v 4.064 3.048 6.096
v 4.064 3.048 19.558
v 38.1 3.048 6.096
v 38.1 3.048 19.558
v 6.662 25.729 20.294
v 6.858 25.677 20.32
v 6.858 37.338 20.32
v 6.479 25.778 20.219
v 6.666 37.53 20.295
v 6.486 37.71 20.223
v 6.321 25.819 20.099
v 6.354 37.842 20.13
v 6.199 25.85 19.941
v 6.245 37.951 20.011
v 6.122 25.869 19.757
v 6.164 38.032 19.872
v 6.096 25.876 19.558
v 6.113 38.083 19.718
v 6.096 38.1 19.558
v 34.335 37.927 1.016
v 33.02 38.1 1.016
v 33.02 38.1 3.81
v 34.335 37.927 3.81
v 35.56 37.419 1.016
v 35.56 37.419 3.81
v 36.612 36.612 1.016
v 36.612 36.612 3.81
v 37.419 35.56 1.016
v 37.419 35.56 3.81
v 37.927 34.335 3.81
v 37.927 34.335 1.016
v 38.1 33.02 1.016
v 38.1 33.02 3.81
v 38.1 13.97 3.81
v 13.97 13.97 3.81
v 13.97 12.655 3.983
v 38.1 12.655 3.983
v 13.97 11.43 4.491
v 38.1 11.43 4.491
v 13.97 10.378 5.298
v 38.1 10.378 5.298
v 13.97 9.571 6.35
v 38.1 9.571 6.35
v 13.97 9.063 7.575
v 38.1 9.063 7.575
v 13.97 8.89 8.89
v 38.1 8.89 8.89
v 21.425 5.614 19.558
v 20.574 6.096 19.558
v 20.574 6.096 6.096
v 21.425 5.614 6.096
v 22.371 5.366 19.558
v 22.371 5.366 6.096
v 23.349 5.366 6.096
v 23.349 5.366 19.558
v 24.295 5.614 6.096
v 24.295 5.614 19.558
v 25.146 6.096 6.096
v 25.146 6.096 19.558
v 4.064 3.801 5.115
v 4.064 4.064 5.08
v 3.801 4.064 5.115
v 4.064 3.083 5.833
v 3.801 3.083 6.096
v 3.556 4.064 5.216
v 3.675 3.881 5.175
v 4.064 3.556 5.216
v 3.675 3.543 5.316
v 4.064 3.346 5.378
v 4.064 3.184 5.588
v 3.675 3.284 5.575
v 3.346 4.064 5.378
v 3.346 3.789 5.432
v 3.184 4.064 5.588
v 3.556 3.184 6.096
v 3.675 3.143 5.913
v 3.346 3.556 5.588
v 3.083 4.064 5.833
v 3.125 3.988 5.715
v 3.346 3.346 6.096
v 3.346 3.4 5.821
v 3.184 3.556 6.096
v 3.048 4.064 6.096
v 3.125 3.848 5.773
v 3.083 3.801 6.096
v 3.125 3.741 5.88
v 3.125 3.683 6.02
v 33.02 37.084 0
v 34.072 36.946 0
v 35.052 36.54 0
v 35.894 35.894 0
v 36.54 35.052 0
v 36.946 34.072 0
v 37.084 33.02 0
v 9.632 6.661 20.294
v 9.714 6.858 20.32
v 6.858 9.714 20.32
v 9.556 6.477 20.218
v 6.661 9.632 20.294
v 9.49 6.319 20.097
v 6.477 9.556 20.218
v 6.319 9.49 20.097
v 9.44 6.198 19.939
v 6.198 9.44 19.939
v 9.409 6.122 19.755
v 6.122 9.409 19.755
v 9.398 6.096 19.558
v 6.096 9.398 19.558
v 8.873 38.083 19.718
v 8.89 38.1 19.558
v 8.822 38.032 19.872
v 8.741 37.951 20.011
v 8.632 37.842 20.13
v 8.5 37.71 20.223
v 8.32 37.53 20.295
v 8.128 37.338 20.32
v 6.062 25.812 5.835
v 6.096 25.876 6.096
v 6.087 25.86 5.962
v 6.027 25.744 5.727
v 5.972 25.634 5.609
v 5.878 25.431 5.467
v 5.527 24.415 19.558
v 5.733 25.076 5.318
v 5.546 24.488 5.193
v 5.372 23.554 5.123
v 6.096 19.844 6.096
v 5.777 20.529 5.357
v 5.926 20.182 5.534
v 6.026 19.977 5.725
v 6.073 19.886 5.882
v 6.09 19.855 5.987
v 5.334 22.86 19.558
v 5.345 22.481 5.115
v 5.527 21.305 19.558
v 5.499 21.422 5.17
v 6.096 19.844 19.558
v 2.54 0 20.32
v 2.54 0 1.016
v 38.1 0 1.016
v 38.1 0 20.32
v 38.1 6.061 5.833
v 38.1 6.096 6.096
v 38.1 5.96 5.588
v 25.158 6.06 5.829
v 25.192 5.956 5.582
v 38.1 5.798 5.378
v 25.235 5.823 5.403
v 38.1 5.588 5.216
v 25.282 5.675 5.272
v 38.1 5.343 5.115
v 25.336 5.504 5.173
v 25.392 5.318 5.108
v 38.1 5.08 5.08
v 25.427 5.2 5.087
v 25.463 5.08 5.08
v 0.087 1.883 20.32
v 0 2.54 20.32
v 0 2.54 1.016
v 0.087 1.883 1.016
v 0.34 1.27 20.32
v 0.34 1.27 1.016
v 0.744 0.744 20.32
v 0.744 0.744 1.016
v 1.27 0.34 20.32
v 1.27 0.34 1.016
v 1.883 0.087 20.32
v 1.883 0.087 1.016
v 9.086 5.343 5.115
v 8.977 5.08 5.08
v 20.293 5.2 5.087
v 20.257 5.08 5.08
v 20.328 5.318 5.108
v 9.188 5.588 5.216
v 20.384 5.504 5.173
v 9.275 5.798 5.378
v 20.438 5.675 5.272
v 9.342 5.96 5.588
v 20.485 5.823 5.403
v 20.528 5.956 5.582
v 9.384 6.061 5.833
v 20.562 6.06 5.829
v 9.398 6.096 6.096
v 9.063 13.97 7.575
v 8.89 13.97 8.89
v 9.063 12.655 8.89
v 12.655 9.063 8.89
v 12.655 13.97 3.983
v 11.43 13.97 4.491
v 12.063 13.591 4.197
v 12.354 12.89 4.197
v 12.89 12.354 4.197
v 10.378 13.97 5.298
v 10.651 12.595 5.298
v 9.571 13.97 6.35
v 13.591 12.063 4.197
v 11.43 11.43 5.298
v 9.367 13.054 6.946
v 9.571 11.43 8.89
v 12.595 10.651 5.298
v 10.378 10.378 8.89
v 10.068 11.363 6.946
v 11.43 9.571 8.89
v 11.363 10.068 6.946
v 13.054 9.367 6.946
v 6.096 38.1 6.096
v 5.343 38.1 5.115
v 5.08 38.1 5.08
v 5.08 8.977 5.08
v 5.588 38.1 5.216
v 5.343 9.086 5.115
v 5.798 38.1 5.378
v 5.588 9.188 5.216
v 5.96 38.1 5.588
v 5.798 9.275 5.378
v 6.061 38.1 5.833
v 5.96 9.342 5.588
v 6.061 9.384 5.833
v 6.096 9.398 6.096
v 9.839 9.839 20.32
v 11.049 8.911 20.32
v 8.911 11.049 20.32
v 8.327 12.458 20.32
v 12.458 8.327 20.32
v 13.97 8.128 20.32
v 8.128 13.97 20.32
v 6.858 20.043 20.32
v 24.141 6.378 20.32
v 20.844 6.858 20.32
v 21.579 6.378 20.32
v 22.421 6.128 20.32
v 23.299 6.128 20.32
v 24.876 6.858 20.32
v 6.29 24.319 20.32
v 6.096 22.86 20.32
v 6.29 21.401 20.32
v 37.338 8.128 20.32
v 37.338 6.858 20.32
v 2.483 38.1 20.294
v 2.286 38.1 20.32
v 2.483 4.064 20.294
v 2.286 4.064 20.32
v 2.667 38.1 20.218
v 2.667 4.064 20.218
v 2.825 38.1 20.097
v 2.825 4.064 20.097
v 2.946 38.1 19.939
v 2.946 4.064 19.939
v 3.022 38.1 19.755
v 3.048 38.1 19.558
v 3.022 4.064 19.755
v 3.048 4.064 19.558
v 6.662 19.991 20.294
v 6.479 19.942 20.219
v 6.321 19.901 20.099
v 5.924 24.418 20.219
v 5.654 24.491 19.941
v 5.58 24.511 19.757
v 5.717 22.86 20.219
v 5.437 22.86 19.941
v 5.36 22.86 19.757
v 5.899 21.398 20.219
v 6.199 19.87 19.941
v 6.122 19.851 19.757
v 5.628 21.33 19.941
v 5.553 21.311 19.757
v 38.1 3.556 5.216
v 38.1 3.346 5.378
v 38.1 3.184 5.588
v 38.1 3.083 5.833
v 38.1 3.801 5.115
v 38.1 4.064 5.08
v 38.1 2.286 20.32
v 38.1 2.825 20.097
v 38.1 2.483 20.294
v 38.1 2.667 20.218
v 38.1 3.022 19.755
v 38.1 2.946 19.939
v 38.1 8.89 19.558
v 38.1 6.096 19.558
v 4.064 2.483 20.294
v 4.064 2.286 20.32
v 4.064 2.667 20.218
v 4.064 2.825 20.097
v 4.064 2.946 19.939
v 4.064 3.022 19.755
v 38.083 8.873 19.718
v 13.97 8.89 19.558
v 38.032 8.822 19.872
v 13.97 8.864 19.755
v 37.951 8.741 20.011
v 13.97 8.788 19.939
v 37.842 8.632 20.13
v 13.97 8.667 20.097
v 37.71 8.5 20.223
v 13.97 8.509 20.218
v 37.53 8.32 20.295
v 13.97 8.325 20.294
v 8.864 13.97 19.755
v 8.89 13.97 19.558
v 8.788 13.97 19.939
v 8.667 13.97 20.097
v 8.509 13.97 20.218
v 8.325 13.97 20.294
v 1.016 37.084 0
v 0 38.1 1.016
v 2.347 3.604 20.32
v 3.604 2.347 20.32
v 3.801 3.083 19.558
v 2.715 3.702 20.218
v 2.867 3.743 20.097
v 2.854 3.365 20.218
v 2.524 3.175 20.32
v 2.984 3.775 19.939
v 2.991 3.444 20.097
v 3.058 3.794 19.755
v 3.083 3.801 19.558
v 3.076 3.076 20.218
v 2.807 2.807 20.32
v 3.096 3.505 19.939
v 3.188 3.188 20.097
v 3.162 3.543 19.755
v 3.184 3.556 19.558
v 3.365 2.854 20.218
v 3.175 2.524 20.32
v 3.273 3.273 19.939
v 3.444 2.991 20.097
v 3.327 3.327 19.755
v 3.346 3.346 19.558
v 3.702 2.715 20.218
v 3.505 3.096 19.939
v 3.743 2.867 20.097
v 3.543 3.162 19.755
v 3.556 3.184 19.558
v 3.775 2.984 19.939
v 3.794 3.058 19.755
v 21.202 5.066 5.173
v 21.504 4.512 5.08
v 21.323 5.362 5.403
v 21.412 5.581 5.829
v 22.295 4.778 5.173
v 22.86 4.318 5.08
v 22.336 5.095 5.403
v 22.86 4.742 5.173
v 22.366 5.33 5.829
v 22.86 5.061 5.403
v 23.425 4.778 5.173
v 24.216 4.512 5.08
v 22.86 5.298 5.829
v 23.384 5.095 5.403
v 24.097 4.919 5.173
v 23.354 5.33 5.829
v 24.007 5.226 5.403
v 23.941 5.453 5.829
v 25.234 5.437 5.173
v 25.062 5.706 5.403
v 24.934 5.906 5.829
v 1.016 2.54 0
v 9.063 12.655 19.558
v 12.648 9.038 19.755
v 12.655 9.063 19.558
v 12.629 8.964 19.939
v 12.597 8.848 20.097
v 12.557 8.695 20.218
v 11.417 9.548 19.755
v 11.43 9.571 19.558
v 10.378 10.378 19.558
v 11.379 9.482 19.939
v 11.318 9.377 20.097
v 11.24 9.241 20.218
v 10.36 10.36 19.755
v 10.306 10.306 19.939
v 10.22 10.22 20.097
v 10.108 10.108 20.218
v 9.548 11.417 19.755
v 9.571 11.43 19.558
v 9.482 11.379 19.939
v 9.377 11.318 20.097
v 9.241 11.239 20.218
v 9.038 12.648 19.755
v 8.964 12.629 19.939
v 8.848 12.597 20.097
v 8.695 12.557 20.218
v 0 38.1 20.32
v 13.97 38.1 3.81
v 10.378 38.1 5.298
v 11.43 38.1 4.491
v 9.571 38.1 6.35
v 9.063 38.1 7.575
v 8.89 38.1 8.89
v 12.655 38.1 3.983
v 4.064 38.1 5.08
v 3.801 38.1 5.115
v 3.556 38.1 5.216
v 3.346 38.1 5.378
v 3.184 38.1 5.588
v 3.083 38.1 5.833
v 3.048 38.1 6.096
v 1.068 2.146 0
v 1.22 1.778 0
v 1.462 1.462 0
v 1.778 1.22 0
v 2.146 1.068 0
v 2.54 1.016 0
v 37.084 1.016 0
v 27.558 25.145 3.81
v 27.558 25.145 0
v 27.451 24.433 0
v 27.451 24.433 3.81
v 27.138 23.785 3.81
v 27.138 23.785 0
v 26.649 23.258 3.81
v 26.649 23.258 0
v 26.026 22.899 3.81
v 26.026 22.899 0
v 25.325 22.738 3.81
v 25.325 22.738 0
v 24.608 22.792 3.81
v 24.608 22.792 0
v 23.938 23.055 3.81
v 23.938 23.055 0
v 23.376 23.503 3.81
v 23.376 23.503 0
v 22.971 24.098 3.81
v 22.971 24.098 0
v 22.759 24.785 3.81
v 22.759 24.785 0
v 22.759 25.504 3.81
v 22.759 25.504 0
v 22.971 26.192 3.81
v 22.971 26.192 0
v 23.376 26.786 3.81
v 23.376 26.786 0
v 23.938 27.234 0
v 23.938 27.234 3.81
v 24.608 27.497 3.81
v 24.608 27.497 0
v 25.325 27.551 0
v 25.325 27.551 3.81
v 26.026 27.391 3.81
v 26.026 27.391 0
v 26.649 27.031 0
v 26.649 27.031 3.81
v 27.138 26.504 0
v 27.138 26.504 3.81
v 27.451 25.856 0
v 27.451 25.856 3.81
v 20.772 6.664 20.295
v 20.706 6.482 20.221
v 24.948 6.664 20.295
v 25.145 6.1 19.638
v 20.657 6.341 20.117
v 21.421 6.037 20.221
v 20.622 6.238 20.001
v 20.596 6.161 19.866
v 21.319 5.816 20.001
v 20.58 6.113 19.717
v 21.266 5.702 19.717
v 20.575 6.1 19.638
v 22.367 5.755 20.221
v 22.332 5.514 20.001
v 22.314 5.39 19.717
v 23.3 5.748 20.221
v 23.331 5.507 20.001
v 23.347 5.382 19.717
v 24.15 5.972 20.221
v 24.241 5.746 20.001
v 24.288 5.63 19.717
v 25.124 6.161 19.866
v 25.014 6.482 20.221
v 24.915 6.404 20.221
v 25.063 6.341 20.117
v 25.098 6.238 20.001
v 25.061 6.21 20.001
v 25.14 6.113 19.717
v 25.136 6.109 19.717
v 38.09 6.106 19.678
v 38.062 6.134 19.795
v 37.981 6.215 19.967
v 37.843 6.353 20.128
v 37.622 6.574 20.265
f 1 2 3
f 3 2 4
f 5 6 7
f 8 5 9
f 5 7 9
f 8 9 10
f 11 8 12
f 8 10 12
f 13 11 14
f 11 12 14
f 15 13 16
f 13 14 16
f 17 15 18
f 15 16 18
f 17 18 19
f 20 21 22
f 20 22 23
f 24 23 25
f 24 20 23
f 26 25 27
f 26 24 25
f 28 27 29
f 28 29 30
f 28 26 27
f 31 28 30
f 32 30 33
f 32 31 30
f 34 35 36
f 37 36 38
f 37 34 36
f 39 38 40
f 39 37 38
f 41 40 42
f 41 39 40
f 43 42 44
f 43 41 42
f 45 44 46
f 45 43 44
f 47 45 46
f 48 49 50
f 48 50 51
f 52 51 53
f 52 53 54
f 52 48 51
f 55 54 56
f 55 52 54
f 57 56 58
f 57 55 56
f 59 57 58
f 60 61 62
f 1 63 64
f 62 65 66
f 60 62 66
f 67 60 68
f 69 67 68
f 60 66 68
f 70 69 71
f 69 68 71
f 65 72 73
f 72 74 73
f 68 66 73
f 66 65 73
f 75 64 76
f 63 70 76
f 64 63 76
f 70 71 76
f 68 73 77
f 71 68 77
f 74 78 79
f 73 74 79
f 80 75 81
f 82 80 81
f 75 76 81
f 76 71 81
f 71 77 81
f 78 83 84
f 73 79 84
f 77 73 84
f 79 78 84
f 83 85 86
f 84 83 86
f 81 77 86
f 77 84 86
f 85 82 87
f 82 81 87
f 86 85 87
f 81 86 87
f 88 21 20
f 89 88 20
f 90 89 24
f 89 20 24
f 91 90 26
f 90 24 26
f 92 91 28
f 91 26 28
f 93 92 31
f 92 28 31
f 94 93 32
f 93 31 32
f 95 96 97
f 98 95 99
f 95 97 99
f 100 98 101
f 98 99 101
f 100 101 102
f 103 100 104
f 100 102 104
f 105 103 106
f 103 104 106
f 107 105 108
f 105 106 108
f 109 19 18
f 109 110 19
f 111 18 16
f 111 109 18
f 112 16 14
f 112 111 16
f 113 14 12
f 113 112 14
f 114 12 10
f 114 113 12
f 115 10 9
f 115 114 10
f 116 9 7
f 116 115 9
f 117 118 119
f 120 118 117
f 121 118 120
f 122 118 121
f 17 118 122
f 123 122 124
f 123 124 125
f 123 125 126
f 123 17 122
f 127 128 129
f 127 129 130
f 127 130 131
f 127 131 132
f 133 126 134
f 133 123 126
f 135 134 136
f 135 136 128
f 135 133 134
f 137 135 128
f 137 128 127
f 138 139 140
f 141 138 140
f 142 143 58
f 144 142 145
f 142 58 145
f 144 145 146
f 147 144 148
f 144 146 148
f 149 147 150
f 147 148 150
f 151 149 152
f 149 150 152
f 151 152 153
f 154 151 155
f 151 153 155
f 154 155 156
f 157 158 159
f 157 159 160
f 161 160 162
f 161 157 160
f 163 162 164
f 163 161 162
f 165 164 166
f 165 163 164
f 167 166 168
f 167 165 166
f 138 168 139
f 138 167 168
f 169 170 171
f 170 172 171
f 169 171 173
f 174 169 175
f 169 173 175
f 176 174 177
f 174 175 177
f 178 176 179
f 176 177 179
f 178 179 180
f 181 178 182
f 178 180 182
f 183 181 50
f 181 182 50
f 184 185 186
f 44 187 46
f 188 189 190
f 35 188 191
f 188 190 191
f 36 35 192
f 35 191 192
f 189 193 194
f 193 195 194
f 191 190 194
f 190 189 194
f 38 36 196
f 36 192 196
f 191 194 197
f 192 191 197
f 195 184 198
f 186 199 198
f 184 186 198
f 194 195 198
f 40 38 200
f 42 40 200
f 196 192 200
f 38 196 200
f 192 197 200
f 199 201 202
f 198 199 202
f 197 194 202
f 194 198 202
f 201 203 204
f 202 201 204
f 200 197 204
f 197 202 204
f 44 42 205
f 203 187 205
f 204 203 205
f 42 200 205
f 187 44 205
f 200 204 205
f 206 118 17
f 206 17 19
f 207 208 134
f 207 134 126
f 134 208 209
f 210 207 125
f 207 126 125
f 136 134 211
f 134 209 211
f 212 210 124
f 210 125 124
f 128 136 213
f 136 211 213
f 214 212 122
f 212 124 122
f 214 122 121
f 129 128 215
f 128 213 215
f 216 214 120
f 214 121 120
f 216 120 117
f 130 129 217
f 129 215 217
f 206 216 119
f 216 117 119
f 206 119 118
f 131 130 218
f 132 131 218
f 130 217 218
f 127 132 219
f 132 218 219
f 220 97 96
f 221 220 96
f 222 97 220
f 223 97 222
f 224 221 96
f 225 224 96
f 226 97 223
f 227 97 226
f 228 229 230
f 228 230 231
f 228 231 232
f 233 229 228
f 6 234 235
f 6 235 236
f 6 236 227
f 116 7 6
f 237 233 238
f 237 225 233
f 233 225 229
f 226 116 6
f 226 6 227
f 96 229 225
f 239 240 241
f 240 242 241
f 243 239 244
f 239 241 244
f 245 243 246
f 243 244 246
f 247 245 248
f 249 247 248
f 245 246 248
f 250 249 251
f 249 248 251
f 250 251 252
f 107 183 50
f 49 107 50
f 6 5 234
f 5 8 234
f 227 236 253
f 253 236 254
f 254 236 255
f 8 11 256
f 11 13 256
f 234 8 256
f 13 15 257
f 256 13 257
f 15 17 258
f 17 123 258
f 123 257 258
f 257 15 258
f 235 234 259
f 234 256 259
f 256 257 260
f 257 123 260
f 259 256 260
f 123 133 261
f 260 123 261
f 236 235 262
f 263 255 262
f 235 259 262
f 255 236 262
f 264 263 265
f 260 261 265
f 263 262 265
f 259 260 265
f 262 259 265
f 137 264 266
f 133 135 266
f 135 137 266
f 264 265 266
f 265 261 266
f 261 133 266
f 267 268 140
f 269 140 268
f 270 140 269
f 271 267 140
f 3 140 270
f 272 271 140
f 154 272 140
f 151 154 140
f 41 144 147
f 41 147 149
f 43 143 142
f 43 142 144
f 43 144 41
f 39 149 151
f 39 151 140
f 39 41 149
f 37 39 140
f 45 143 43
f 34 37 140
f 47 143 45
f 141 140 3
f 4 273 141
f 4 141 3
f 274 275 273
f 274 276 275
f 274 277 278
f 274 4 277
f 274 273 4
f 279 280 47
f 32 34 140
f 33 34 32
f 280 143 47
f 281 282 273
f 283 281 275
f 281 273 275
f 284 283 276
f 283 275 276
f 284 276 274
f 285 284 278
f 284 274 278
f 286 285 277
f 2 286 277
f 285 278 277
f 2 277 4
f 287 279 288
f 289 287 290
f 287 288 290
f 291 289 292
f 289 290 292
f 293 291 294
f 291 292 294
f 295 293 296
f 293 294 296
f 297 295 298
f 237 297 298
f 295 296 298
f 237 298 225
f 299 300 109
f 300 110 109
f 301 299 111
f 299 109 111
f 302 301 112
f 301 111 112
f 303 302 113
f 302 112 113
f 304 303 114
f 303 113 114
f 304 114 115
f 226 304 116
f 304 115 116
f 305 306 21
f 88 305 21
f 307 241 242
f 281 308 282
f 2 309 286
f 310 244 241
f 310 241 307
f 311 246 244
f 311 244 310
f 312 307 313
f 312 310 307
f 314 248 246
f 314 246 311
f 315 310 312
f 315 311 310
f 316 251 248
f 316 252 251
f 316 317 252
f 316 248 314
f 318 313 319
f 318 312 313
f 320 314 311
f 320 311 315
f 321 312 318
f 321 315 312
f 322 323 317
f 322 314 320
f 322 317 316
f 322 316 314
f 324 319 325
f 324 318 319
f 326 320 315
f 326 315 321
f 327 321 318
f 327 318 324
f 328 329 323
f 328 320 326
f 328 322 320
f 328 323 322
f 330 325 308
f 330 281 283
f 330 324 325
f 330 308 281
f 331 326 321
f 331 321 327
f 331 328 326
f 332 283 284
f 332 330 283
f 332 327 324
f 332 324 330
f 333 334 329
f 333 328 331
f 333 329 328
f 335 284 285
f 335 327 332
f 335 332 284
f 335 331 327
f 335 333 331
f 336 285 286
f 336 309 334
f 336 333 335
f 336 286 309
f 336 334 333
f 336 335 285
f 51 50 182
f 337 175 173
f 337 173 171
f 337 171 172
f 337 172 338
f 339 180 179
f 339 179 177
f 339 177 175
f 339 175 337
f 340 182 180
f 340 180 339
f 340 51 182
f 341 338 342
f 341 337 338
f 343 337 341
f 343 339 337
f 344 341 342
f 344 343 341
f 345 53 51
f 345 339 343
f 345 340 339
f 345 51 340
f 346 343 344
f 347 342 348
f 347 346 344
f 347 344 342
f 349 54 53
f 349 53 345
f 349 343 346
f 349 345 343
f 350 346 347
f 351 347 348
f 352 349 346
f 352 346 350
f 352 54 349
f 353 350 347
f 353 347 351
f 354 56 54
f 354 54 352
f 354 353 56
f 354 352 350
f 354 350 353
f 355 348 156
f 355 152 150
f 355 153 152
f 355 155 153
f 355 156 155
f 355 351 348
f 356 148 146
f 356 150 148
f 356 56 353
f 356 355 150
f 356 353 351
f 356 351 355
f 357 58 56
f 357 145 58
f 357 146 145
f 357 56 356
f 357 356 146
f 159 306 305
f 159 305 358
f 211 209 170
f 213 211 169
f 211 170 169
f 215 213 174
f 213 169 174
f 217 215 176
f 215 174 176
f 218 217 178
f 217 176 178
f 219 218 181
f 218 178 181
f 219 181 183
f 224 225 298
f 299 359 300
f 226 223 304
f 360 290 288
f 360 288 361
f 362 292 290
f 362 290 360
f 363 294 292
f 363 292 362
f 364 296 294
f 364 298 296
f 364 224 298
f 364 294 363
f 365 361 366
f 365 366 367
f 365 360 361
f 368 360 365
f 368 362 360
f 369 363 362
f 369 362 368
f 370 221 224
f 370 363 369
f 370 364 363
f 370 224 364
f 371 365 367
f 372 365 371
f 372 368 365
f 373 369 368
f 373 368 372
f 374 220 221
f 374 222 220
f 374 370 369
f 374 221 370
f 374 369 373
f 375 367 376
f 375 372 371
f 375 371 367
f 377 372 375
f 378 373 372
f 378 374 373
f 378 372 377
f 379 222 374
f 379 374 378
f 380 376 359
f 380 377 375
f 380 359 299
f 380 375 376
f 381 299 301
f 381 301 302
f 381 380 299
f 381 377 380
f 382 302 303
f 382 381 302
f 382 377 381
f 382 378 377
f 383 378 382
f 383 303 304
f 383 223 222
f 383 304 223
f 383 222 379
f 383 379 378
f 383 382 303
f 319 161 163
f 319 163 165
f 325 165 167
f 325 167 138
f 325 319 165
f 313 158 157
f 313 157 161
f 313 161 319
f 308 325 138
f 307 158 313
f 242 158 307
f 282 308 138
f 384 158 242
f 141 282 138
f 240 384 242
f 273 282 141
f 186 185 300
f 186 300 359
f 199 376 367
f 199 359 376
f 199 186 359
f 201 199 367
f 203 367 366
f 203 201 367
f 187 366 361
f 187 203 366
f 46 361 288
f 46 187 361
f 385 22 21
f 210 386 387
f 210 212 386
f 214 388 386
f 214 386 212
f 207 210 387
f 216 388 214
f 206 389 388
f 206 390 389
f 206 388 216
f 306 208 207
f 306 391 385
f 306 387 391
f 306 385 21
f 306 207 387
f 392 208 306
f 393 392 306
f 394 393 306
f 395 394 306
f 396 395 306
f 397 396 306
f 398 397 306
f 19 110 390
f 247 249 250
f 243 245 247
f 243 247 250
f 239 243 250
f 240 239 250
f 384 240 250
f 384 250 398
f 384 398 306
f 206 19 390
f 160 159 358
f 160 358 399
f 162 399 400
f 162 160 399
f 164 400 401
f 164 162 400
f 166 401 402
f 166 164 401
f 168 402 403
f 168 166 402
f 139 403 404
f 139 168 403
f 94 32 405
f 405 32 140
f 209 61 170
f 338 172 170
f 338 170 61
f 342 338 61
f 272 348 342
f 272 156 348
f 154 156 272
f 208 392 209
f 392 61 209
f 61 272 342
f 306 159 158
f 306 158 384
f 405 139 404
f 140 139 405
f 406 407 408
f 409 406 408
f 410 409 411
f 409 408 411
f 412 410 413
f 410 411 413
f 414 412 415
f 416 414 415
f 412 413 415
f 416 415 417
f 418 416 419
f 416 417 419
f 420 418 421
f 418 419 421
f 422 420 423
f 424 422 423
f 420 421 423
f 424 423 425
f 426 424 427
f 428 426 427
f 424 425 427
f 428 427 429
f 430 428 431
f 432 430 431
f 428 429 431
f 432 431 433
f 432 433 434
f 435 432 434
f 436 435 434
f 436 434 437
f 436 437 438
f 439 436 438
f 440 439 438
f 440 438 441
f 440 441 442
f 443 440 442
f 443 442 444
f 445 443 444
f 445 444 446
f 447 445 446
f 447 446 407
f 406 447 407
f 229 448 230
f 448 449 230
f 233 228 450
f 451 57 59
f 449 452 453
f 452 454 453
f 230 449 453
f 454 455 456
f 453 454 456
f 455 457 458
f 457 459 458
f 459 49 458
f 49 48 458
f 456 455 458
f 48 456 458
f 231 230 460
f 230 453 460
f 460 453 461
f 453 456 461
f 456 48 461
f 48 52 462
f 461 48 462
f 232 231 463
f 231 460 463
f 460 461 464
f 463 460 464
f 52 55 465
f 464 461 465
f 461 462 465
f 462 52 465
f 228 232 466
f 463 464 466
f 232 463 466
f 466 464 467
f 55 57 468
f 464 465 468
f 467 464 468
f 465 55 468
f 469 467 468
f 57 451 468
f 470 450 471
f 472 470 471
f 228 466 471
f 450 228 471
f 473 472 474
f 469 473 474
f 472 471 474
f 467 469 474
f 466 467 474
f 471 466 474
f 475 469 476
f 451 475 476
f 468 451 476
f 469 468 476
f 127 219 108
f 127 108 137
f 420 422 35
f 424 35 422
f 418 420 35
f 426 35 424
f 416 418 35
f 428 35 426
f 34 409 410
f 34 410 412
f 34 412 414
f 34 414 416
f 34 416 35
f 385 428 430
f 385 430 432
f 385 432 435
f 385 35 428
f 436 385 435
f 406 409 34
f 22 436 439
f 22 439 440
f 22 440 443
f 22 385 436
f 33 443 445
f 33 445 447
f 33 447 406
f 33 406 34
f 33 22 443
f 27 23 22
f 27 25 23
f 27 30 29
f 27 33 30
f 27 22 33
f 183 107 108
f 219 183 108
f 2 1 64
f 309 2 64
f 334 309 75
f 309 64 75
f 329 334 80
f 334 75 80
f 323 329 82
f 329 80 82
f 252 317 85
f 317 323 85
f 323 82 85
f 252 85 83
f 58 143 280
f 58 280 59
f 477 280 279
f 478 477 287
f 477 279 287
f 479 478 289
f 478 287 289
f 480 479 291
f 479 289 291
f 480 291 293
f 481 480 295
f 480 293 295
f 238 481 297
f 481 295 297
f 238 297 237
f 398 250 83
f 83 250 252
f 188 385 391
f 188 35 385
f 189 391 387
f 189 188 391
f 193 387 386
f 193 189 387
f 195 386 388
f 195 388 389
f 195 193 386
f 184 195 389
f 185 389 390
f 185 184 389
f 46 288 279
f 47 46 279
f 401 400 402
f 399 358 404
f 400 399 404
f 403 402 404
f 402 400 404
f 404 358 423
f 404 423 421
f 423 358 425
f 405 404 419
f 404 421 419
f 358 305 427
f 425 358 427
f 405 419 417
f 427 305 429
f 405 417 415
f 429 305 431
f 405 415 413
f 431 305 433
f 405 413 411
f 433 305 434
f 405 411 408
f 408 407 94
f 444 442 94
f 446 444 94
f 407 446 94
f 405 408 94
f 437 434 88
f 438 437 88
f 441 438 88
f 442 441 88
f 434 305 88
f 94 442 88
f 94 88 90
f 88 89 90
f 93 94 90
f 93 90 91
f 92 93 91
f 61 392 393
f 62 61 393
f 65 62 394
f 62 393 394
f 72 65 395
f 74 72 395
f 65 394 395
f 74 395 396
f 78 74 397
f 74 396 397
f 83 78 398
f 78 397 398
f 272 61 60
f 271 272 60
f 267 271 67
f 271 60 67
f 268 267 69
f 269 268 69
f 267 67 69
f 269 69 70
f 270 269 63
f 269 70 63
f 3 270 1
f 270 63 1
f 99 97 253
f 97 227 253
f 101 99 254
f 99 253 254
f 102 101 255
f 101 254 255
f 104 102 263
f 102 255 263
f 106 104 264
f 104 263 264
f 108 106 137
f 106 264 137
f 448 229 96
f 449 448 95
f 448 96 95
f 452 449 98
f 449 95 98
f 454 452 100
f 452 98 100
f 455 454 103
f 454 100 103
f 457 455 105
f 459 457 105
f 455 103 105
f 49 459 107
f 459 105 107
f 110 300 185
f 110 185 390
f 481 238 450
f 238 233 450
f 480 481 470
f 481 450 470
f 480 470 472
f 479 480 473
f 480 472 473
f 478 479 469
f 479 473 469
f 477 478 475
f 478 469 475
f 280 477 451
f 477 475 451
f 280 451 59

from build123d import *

# Parameters (mm, degrees)
F0_W          = 38.1
F0_H          = 38.1
F1_DEPTH      = 20.32
F2_W          = 29.21
F2_H          = 29.21
F3_DEPTH      = 16.51
F5_DEPTH      = 15.24
F6_T1_DEPTH   = 29.21
F7_R          = 5.08
F8_R          = 5.08
F9_R          = 2.54
F10_R         = 2.413
F11_DEPTH     = 20.321
F13_DEPTH     = 15.24
F14_T1_DEPTH  = 14.224
F14_T3_DEPTH  = 34.036
F14_T5_DEPTH  = 34.036
F14_T7_DEPTH  = 19.05
F14_T9_DEPTH  = 18.3199171099
F14_S13_W     = 1.03632
F14_S13_H     = 1.03632
F14_T14_DEPTH = 1.03632
F14_T20_DEPTH = 16.861733183
F14_T26_DEPTH = 22.6379171099
F14_T31_DEPTH = 23.368
F14_T36_ANGLE = 257.1357278548
F14_T42_DEPTH = 16.861733183
F14_T46_DEPTH = 23.368
F14_T53_DEPTH = 16.861733183
F14_T57_DEPTH = 22.6379171099
F15_SIZE      = 1.016
F16_R         = 0.762


# Not quite as in the source:
# - a fillet or chamfer that OpenCascade refuses, or shapes differently, is made with other operations: its cross-section is extruded or revolved along the edge and cut away or added


with BuildPart() as f1:
    # F0 (on Top) → F1 (new body)
    with BuildSketch(Plane.XY):
        with Locations((19.05, 19.05)):
            Rectangle(F0_W, F0_H)
    extrude(amount=F1_DEPTH)

    # F2 (on face) → F3 (cut)
    with BuildSketch(Plane.XY.offset(20.32)):
        with Locations((23.495, 23.495)):
            Rectangle(F2_W, F2_H)
    extrude(amount=-F3_DEPTH, mode=Mode.SUBTRACT)

    # F4 (on face) → F5 (cut)
    with BuildSketch(Plane.XY.offset(20.32)):
        Polygon((6.096, 38.1), (3.048, 38.1), (3.048, 3.048), (38.1, 3.048), (38.1, 6.096), (9.398, 6.096), (6.096, 6.096), (6.096, 9.398), align=None)
        Polygon((9.398, 6.096), (6.096, 9.398), (6.096, 6.096), align=None)
    extrude(amount=-F5_DEPTH, mode=Mode.SUBTRACT)

    # F6: fillet of radius 5.08 on 1 edges, made by hand

    # F6_s2 → F6_t1 (cut)
    with BuildSketch(Plane.XY.offset(-12.7)):
        with BuildLine():
            ThreePointArc((33.02, 38.1), (36.6121024484, 36.6121024484), (38.1, 33.02))
            Line((38.1, 33.02), (38.1, 38.1))
            Line((38.1, 38.1), (33.02, 38.1))
        make_face()
    extrude(amount=F6_T1_DEPTH, mode=Mode.SUBTRACT)

    # F7
    f7_edges = [f1.edges().sort_by_distance(p)[0] for p in [
        (8.89, 8.89, 12.065),
    ]]
    fillet(f7_edges, radius=F7_R)

    # F8
    f8_edges = [f1.edges().sort_by_distance(p)[0] for p in [
        (26.035, 8.89, 3.81),
        (10.377898, 10.377898, 3.81),
        (8.89, 26.035, 3.81),
    ]]
    fillet(f8_edges, radius=F8_R)

    # F9
    f9_edges = [f1.edges().sort_by_distance(p)[0] for p in [
        (0, 0, 10.16),
    ]]
    fillet(f9_edges, radius=F9_R)

    # F10 (on face) → F11 (cut, through all)
    with BuildSketch(Plane(origin=(0, 0, 0), x_dir=(1, 0, 0), z_dir=(0, 0, -1))):
        with Locations((25.144717139, -25.144717139)):
            Circle(F10_R)
    extrude(amount=-F11_DEPTH, mode=Mode.SUBTRACT)

    # F12 (on face) → F13 (join, through all)
    with BuildSketch(Plane.XY.offset(20.32)):
        with BuildLine():
            Line((25.146, 6.096), (20.574, 6.096))
            ThreePointArc((20.574, 6.096), (22.86, 5.334), (25.146, 6.096))
        make_face()
        with BuildLine():
            Line((6.096, 19.8439171099), (6.096, 25.8760828901))
            ThreePointArc((6.096, 25.8760828901), (5.334, 22.86), (6.096, 19.8439171099))
        make_face()
    extrude(amount=-F13_DEPTH)

    # F14: fillet of radius 1.016 on 9 edges, made by hand

    # F14_s2 → F14_t1 (join)
    with BuildSketch(Plane.XY.offset(6.096)):
        with BuildLine():
            ThreePointArc((4.064, 3.048), (3.3455795103, 3.3455795103), (3.048, 4.064))
            Line((3.048, 4.064), (3.02768, 4.064))
            Line((3.02768, 4.064), (3.02768, 3.02768))
            Line((3.02768, 3.02768), (4.064, 3.02768))
            Line((4.064, 3.02768), (4.064, 3.048))
        make_face()
    extrude(amount=F14_T1_DEPTH)

    # F14_s4 → F14_t3 (join)
    with BuildSketch(Plane.YZ.offset(4.064)):
        with BuildLine():
            ThreePointArc((4.064, 5.08), (3.3455795103, 5.3775795103), (3.048, 6.096))
            Line((3.048, 6.096), (3.02768, 6.096))
            Line((3.02768, 6.096), (3.02768, 5.05968))
            Line((3.02768, 5.05968), (4.064, 5.05968))
            Line((4.064, 5.05968), (4.064, 5.08))
        make_face()
    extrude(amount=F14_T3_DEPTH)

    # F14_s6 → F14_t5 (join)
    with BuildSketch(Plane.XZ.offset(-38.1)):
        with BuildLine():
            ThreePointArc((4.064, 5.08), (3.3455795103, 5.3775795103), (3.048, 6.096))
            Line((3.048, 6.096), (3.02768, 6.096))
            Line((3.02768, 6.096), (3.02768, 5.05968))
            Line((3.02768, 5.05968), (4.064, 5.05968))
            Line((4.064, 5.05968), (4.064, 5.08))
        make_face()
    extrude(amount=F14_T5_DEPTH)

    # F14_s8 → F14_t7 (join)
    with BuildSketch(Plane.YZ.offset(19.05)):
        with BuildLine():
            ThreePointArc((6.096, 6.096), (5.7984204897, 5.3775795103), (5.08, 5.08))
            Line((5.08, 5.08), (5.08, 5.05968))
            Line((5.08, 5.05968), (6.11632, 5.05968))
            Line((6.11632, 5.05968), (6.11632, 6.096))
            Line((6.11632, 6.096), (6.096, 6.096))
        make_face()
    extrude(amount=F14_T7_DEPTH)

    # F14_s10 → F14_t9 (join)
    with BuildSketch(Plane.XZ.offset(-38.1)):
        with BuildLine():
            ThreePointArc((5.08, 5.08), (5.7984204897, 5.3775795103), (6.096, 6.096))
            Line((6.096, 6.096), (6.11632, 6.096))
            Line((6.11632, 6.096), (6.11632, 5.05968))
            Line((6.11632, 5.05968), (5.08, 5.05968))
            Line((5.08, 5.05968), (5.08, 5.08))
        make_face()
    extrude(amount=F14_T9_DEPTH)


with BuildPart() as f14_tool12:
    # F14_s13 → F14_t14 (new body)
    with BuildSketch(Plane.YZ.offset(4.064)):
        with Locations((3.54584, 5.57784)):
            Rectangle(F14_S13_W, F14_S13_H)
    extrude(amount=-F14_T14_DEPTH)

    # F14_s15 → F14_t16 (revolve, cut)
    with BuildSketch(Plane(origin=(4.064, 4.064, 6.096), x_dir=(0, 0.7071067812, 0.7071067812), z_dir=(0, -0.7071067812, 0.7071067812))):
        with BuildLine():
            ThreePointArc((0, -1.016), (1.016, 0), (0, 1.016))
            Line((0, 1.016), (0, -1.016))
        make_face()
    revolve(axis=Axis((4.064, 4.064, 6.096), (-1, 0, 0)), mode=Mode.SUBTRACT)


with BuildPart() as f1_1:
    add(f1.part)

    # F14_t11: union F14_tool12
    add(f14_tool12.part)


with BuildPart() as f14_tool18:
    # F14_s19 → F14_t20 (new body)
    with BuildSketch(Plane(origin=(5.9615229381, -5.9615229381, 0), x_dir=(0, 0, 1), z_dir=(-0.7071067812, 0.7071067812, 0))):
        with BuildLine():
            ThreePointArc((5.08, 9.9399124677), (5.3775795103, 10.6583329574), (6.096, 10.9559124677))
            Line((6.096, 10.9559124677), (6.096, 10.9762324677))
            Line((6.096, 10.9762324677), (5.05968, 10.9762324677))
            Line((5.05968, 10.9762324677), (5.05968, 9.9399124677))
            Line((5.05968, 9.9399124677), (5.08, 9.9399124677))
        make_face()
    extrude(amount=F14_T20_DEPTH)

    split(bisect_by=Plane.YZ.offset(6.096), keep=Keep.TOP)

    split(bisect_by=Plane.XZ.offset(-6.096), keep=Keep.BOTTOM)


with BuildPart() as f1_2:
    add(f1_1.part)

    # F14_t17: union F14_tool18
    add(f14_tool18.part)


with BuildPart() as f14_tool24:
    # F14_s25 → F14_t26 (new body)
    with BuildSketch(Plane.XZ.offset(-3.302)):
        with BuildLine():
            ThreePointArc((5.08, 5.08), (5.7984204897, 5.3775795103), (6.096, 6.096))
            Line((6.096, 6.096), (6.11632, 6.096))
            Line((6.11632, 6.096), (6.11632, 5.05968))
            Line((6.11632, 5.05968), (5.08, 5.05968))
            Line((5.08, 5.05968), (5.08, 5.08))
        make_face()
    extrude(amount=-F14_T26_DEPTH)

    split(bisect_by=Plane(origin=(7.747, 7.747, 0), x_dir=(0, 0, 1), z_dir=(0.7071067812, 0.7071067812, 0)), keep=Keep.TOP)


with BuildPart() as f1_3:
    add(f1_2.part)

    # F14_t23: union F14_tool24
    add(f14_tool24.part)


with BuildPart() as f14_tool29:
    # F14_s30 → F14_t31 (new body)
    with BuildSketch(Plane.YZ.offset(26.67)):
        with BuildLine():
            ThreePointArc((5.08, 5.08), (5.7984204897, 5.3775795103), (6.096, 6.096))
            Line((6.096, 6.096), (6.11632, 6.096))
            Line((6.11632, 6.096), (6.11632, 5.05968))
            Line((6.11632, 5.05968), (5.08, 5.05968))
            Line((5.08, 5.05968), (5.08, 5.08))
        make_face()
    extrude(amount=-F14_T31_DEPTH)

    split(bisect_by=Plane(origin=(7.747, 7.747, 0), x_dir=(0, 0, 1), z_dir=(0.7071067812, 0.7071067812, 0)), keep=Keep.TOP)


with BuildPart() as f1_4:
    add(f1_3.part)

    # F14_t28: union F14_tool29
    add(f14_tool29.part)


with BuildPart() as f14_tool34:
    # F14_s35 → F14_t36 (revolve)
    with BuildSketch(Plane(origin=(13.3424429627, 16.7330298048, 0), x_dir=(0, 0, 1), z_dir=(0.6234411592, 0.7818702712, 0))):
        with BuildLine():
            ThreePointArc((5.08, 7.3468084408), (5.3775795103, 8.0652289305), (6.096, 8.3628084408))
            Line((6.096, 8.3628084408), (6.096, 8.3831284408))
            Line((6.096, 8.3831284408), (5.05968, 8.3831284408))
            Line((5.05968, 8.3831284408), (5.05968, 7.3468084408))
            Line((5.05968, 7.3468084408), (5.08, 7.3468084408))
        make_face()
    revolve(axis=Axis((22.86, 9.144, 5.08), (0, 0, 1)), revolution_arc=F14_T36_ANGLE)

    split(bisect_by=Plane.XZ.offset(-6.096), keep=Keep.TOP)


with BuildPart() as f1_5:
    add(f1_4.part)

    # F14_t33: union F14_tool34
    add(f14_tool34.part)


with BuildPart() as f14_tool40:
    # F14_s41 → F14_t42 (new body)
    with BuildSketch(Plane(origin=(5.9615229381, -5.9615229381, 0), x_dir=(0, 0, 1), z_dir=(-0.7071067812, 0.7071067812, 0))):
        with BuildLine():
            ThreePointArc((5.08, 9.9399124677), (5.3775795103, 10.6583329574), (6.096, 10.9559124677))
            Line((6.096, 10.9559124677), (6.096, 10.9762324677))
            Line((6.096, 10.9762324677), (5.05968, 10.9762324677))
            Line((5.05968, 10.9762324677), (5.05968, 9.9399124677))
            Line((5.05968, 9.9399124677), (5.08, 9.9399124677))
        make_face()
    extrude(amount=F14_T42_DEPTH)

    split(bisect_by=Plane.XZ.offset(-6.096), keep=Keep.TOP)


with BuildPart() as f14_tool44:
    # F14_s45 → F14_t46 (new body)
    with BuildSketch(Plane.YZ.offset(26.67)):
        with BuildLine():
            ThreePointArc((5.08, 5.08), (5.7984204897, 5.3775795103), (6.096, 6.096))
            Line((6.096, 6.096), (6.11632, 6.096))
            Line((6.11632, 6.096), (6.11632, 5.05968))
            Line((6.11632, 5.05968), (5.08, 5.05968))
            Line((5.08, 5.05968), (5.08, 5.08))
        make_face()
    extrude(amount=-F14_T46_DEPTH)

    split(bisect_by=Plane(origin=(7.747, 7.747, 0), x_dir=(0, 0, 1), z_dir=(-0.7071067812, -0.7071067812, 0)), keep=Keep.TOP)


with BuildPart() as f14_tool40_1:
    add(f14_tool40.part)

    # F14_t48: intersect F14_tool44
    add(f14_tool44.part, mode=Mode.INTERSECT)


with BuildPart() as f1_6:
    add(f1_5.part)

    # F14_t38: union F14_tool40
    add(f14_tool40_1.part)


with BuildPart() as f14_tool51:
    # F14_s52 → F14_t53 (new body)
    with BuildSketch(Plane(origin=(5.9615229381, -5.9615229381, 0), x_dir=(0, 0, 1), z_dir=(-0.7071067812, 0.7071067812, 0))):
        with BuildLine():
            ThreePointArc((5.08, 9.9399124677), (5.3775795103, 10.6583329574), (6.096, 10.9559124677))
            Line((6.096, 10.9559124677), (6.096, 10.9762324677))
            Line((6.096, 10.9762324677), (5.05968, 10.9762324677))
            Line((5.05968, 10.9762324677), (5.05968, 9.9399124677))
            Line((5.05968, 9.9399124677), (5.08, 9.9399124677))
        make_face()
    extrude(amount=F14_T53_DEPTH)

    split(bisect_by=Plane.YZ.offset(6.096), keep=Keep.BOTTOM)


with BuildPart() as f14_tool55:
    # F14_s56 → F14_t57 (new body)
    with BuildSketch(Plane.XZ.offset(-3.302)):
        with BuildLine():
            ThreePointArc((5.08, 5.08), (5.7984204897, 5.3775795103), (6.096, 6.096))
            Line((6.096, 6.096), (6.11632, 6.096))
            Line((6.11632, 6.096), (6.11632, 5.05968))
            Line((6.11632, 5.05968), (5.08, 5.05968))
            Line((5.08, 5.05968), (5.08, 5.08))
        make_face()
    extrude(amount=-F14_T57_DEPTH)

    split(bisect_by=Plane(origin=(7.747, 7.747, 0), x_dir=(0, 0, 1), z_dir=(-0.7071067812, -0.7071067812, 0)), keep=Keep.TOP)


with BuildPart() as f14_tool51_1:
    add(f14_tool51.part)

    # F14_t59: intersect F14_tool55
    add(f14_tool55.part, mode=Mode.INTERSECT)


with BuildPart() as f1_7:
    add(f1_6.part)

    # F14_t49: union F14_tool51
    add(f14_tool51_1.part)

    # F15
    f15_edges = [f1_7.edges().sort_by_distance(p)[0] for p in [
        (20.32, 0, 0),
        (16.51, 38.1, 0),
        (36.612102, 36.612102, 0),
        (0.743949, 0.743949, 0),
        (38.1, 16.51, 0),
        (0, 20.32, 0),
    ]]
    chamfer(f15_edges, length=F15_SIZE)

    # F16
    f16_edges = [f1_7.edges().sort_by_distance(p)[0] for p in [
        (3.048, 21.082, 20.32),
        (31.623, 6.096, 20.32),
        (22.86, 5.334, 20.32),
        (8.89, 26.035, 20.32),
        (7.493, 38.1, 20.32),
        (6.096, 31.988041, 20.32),
        (5.334, 22.86, 20.32),
        (6.096, 14.620959, 20.32),
        (7.747, 7.747, 20.32),
        (14.986, 6.096, 20.32),
        (38.1, 7.493, 20.32),
        (26.035, 8.89, 20.32),
        (10.377898, 10.377898, 20.32),
        (21.082, 3.048, 20.32),
        (3.34558, 3.34558, 20.32),
    ]]
    fillet(f16_edges, radius=F16_R)


solid = f1_7.part
